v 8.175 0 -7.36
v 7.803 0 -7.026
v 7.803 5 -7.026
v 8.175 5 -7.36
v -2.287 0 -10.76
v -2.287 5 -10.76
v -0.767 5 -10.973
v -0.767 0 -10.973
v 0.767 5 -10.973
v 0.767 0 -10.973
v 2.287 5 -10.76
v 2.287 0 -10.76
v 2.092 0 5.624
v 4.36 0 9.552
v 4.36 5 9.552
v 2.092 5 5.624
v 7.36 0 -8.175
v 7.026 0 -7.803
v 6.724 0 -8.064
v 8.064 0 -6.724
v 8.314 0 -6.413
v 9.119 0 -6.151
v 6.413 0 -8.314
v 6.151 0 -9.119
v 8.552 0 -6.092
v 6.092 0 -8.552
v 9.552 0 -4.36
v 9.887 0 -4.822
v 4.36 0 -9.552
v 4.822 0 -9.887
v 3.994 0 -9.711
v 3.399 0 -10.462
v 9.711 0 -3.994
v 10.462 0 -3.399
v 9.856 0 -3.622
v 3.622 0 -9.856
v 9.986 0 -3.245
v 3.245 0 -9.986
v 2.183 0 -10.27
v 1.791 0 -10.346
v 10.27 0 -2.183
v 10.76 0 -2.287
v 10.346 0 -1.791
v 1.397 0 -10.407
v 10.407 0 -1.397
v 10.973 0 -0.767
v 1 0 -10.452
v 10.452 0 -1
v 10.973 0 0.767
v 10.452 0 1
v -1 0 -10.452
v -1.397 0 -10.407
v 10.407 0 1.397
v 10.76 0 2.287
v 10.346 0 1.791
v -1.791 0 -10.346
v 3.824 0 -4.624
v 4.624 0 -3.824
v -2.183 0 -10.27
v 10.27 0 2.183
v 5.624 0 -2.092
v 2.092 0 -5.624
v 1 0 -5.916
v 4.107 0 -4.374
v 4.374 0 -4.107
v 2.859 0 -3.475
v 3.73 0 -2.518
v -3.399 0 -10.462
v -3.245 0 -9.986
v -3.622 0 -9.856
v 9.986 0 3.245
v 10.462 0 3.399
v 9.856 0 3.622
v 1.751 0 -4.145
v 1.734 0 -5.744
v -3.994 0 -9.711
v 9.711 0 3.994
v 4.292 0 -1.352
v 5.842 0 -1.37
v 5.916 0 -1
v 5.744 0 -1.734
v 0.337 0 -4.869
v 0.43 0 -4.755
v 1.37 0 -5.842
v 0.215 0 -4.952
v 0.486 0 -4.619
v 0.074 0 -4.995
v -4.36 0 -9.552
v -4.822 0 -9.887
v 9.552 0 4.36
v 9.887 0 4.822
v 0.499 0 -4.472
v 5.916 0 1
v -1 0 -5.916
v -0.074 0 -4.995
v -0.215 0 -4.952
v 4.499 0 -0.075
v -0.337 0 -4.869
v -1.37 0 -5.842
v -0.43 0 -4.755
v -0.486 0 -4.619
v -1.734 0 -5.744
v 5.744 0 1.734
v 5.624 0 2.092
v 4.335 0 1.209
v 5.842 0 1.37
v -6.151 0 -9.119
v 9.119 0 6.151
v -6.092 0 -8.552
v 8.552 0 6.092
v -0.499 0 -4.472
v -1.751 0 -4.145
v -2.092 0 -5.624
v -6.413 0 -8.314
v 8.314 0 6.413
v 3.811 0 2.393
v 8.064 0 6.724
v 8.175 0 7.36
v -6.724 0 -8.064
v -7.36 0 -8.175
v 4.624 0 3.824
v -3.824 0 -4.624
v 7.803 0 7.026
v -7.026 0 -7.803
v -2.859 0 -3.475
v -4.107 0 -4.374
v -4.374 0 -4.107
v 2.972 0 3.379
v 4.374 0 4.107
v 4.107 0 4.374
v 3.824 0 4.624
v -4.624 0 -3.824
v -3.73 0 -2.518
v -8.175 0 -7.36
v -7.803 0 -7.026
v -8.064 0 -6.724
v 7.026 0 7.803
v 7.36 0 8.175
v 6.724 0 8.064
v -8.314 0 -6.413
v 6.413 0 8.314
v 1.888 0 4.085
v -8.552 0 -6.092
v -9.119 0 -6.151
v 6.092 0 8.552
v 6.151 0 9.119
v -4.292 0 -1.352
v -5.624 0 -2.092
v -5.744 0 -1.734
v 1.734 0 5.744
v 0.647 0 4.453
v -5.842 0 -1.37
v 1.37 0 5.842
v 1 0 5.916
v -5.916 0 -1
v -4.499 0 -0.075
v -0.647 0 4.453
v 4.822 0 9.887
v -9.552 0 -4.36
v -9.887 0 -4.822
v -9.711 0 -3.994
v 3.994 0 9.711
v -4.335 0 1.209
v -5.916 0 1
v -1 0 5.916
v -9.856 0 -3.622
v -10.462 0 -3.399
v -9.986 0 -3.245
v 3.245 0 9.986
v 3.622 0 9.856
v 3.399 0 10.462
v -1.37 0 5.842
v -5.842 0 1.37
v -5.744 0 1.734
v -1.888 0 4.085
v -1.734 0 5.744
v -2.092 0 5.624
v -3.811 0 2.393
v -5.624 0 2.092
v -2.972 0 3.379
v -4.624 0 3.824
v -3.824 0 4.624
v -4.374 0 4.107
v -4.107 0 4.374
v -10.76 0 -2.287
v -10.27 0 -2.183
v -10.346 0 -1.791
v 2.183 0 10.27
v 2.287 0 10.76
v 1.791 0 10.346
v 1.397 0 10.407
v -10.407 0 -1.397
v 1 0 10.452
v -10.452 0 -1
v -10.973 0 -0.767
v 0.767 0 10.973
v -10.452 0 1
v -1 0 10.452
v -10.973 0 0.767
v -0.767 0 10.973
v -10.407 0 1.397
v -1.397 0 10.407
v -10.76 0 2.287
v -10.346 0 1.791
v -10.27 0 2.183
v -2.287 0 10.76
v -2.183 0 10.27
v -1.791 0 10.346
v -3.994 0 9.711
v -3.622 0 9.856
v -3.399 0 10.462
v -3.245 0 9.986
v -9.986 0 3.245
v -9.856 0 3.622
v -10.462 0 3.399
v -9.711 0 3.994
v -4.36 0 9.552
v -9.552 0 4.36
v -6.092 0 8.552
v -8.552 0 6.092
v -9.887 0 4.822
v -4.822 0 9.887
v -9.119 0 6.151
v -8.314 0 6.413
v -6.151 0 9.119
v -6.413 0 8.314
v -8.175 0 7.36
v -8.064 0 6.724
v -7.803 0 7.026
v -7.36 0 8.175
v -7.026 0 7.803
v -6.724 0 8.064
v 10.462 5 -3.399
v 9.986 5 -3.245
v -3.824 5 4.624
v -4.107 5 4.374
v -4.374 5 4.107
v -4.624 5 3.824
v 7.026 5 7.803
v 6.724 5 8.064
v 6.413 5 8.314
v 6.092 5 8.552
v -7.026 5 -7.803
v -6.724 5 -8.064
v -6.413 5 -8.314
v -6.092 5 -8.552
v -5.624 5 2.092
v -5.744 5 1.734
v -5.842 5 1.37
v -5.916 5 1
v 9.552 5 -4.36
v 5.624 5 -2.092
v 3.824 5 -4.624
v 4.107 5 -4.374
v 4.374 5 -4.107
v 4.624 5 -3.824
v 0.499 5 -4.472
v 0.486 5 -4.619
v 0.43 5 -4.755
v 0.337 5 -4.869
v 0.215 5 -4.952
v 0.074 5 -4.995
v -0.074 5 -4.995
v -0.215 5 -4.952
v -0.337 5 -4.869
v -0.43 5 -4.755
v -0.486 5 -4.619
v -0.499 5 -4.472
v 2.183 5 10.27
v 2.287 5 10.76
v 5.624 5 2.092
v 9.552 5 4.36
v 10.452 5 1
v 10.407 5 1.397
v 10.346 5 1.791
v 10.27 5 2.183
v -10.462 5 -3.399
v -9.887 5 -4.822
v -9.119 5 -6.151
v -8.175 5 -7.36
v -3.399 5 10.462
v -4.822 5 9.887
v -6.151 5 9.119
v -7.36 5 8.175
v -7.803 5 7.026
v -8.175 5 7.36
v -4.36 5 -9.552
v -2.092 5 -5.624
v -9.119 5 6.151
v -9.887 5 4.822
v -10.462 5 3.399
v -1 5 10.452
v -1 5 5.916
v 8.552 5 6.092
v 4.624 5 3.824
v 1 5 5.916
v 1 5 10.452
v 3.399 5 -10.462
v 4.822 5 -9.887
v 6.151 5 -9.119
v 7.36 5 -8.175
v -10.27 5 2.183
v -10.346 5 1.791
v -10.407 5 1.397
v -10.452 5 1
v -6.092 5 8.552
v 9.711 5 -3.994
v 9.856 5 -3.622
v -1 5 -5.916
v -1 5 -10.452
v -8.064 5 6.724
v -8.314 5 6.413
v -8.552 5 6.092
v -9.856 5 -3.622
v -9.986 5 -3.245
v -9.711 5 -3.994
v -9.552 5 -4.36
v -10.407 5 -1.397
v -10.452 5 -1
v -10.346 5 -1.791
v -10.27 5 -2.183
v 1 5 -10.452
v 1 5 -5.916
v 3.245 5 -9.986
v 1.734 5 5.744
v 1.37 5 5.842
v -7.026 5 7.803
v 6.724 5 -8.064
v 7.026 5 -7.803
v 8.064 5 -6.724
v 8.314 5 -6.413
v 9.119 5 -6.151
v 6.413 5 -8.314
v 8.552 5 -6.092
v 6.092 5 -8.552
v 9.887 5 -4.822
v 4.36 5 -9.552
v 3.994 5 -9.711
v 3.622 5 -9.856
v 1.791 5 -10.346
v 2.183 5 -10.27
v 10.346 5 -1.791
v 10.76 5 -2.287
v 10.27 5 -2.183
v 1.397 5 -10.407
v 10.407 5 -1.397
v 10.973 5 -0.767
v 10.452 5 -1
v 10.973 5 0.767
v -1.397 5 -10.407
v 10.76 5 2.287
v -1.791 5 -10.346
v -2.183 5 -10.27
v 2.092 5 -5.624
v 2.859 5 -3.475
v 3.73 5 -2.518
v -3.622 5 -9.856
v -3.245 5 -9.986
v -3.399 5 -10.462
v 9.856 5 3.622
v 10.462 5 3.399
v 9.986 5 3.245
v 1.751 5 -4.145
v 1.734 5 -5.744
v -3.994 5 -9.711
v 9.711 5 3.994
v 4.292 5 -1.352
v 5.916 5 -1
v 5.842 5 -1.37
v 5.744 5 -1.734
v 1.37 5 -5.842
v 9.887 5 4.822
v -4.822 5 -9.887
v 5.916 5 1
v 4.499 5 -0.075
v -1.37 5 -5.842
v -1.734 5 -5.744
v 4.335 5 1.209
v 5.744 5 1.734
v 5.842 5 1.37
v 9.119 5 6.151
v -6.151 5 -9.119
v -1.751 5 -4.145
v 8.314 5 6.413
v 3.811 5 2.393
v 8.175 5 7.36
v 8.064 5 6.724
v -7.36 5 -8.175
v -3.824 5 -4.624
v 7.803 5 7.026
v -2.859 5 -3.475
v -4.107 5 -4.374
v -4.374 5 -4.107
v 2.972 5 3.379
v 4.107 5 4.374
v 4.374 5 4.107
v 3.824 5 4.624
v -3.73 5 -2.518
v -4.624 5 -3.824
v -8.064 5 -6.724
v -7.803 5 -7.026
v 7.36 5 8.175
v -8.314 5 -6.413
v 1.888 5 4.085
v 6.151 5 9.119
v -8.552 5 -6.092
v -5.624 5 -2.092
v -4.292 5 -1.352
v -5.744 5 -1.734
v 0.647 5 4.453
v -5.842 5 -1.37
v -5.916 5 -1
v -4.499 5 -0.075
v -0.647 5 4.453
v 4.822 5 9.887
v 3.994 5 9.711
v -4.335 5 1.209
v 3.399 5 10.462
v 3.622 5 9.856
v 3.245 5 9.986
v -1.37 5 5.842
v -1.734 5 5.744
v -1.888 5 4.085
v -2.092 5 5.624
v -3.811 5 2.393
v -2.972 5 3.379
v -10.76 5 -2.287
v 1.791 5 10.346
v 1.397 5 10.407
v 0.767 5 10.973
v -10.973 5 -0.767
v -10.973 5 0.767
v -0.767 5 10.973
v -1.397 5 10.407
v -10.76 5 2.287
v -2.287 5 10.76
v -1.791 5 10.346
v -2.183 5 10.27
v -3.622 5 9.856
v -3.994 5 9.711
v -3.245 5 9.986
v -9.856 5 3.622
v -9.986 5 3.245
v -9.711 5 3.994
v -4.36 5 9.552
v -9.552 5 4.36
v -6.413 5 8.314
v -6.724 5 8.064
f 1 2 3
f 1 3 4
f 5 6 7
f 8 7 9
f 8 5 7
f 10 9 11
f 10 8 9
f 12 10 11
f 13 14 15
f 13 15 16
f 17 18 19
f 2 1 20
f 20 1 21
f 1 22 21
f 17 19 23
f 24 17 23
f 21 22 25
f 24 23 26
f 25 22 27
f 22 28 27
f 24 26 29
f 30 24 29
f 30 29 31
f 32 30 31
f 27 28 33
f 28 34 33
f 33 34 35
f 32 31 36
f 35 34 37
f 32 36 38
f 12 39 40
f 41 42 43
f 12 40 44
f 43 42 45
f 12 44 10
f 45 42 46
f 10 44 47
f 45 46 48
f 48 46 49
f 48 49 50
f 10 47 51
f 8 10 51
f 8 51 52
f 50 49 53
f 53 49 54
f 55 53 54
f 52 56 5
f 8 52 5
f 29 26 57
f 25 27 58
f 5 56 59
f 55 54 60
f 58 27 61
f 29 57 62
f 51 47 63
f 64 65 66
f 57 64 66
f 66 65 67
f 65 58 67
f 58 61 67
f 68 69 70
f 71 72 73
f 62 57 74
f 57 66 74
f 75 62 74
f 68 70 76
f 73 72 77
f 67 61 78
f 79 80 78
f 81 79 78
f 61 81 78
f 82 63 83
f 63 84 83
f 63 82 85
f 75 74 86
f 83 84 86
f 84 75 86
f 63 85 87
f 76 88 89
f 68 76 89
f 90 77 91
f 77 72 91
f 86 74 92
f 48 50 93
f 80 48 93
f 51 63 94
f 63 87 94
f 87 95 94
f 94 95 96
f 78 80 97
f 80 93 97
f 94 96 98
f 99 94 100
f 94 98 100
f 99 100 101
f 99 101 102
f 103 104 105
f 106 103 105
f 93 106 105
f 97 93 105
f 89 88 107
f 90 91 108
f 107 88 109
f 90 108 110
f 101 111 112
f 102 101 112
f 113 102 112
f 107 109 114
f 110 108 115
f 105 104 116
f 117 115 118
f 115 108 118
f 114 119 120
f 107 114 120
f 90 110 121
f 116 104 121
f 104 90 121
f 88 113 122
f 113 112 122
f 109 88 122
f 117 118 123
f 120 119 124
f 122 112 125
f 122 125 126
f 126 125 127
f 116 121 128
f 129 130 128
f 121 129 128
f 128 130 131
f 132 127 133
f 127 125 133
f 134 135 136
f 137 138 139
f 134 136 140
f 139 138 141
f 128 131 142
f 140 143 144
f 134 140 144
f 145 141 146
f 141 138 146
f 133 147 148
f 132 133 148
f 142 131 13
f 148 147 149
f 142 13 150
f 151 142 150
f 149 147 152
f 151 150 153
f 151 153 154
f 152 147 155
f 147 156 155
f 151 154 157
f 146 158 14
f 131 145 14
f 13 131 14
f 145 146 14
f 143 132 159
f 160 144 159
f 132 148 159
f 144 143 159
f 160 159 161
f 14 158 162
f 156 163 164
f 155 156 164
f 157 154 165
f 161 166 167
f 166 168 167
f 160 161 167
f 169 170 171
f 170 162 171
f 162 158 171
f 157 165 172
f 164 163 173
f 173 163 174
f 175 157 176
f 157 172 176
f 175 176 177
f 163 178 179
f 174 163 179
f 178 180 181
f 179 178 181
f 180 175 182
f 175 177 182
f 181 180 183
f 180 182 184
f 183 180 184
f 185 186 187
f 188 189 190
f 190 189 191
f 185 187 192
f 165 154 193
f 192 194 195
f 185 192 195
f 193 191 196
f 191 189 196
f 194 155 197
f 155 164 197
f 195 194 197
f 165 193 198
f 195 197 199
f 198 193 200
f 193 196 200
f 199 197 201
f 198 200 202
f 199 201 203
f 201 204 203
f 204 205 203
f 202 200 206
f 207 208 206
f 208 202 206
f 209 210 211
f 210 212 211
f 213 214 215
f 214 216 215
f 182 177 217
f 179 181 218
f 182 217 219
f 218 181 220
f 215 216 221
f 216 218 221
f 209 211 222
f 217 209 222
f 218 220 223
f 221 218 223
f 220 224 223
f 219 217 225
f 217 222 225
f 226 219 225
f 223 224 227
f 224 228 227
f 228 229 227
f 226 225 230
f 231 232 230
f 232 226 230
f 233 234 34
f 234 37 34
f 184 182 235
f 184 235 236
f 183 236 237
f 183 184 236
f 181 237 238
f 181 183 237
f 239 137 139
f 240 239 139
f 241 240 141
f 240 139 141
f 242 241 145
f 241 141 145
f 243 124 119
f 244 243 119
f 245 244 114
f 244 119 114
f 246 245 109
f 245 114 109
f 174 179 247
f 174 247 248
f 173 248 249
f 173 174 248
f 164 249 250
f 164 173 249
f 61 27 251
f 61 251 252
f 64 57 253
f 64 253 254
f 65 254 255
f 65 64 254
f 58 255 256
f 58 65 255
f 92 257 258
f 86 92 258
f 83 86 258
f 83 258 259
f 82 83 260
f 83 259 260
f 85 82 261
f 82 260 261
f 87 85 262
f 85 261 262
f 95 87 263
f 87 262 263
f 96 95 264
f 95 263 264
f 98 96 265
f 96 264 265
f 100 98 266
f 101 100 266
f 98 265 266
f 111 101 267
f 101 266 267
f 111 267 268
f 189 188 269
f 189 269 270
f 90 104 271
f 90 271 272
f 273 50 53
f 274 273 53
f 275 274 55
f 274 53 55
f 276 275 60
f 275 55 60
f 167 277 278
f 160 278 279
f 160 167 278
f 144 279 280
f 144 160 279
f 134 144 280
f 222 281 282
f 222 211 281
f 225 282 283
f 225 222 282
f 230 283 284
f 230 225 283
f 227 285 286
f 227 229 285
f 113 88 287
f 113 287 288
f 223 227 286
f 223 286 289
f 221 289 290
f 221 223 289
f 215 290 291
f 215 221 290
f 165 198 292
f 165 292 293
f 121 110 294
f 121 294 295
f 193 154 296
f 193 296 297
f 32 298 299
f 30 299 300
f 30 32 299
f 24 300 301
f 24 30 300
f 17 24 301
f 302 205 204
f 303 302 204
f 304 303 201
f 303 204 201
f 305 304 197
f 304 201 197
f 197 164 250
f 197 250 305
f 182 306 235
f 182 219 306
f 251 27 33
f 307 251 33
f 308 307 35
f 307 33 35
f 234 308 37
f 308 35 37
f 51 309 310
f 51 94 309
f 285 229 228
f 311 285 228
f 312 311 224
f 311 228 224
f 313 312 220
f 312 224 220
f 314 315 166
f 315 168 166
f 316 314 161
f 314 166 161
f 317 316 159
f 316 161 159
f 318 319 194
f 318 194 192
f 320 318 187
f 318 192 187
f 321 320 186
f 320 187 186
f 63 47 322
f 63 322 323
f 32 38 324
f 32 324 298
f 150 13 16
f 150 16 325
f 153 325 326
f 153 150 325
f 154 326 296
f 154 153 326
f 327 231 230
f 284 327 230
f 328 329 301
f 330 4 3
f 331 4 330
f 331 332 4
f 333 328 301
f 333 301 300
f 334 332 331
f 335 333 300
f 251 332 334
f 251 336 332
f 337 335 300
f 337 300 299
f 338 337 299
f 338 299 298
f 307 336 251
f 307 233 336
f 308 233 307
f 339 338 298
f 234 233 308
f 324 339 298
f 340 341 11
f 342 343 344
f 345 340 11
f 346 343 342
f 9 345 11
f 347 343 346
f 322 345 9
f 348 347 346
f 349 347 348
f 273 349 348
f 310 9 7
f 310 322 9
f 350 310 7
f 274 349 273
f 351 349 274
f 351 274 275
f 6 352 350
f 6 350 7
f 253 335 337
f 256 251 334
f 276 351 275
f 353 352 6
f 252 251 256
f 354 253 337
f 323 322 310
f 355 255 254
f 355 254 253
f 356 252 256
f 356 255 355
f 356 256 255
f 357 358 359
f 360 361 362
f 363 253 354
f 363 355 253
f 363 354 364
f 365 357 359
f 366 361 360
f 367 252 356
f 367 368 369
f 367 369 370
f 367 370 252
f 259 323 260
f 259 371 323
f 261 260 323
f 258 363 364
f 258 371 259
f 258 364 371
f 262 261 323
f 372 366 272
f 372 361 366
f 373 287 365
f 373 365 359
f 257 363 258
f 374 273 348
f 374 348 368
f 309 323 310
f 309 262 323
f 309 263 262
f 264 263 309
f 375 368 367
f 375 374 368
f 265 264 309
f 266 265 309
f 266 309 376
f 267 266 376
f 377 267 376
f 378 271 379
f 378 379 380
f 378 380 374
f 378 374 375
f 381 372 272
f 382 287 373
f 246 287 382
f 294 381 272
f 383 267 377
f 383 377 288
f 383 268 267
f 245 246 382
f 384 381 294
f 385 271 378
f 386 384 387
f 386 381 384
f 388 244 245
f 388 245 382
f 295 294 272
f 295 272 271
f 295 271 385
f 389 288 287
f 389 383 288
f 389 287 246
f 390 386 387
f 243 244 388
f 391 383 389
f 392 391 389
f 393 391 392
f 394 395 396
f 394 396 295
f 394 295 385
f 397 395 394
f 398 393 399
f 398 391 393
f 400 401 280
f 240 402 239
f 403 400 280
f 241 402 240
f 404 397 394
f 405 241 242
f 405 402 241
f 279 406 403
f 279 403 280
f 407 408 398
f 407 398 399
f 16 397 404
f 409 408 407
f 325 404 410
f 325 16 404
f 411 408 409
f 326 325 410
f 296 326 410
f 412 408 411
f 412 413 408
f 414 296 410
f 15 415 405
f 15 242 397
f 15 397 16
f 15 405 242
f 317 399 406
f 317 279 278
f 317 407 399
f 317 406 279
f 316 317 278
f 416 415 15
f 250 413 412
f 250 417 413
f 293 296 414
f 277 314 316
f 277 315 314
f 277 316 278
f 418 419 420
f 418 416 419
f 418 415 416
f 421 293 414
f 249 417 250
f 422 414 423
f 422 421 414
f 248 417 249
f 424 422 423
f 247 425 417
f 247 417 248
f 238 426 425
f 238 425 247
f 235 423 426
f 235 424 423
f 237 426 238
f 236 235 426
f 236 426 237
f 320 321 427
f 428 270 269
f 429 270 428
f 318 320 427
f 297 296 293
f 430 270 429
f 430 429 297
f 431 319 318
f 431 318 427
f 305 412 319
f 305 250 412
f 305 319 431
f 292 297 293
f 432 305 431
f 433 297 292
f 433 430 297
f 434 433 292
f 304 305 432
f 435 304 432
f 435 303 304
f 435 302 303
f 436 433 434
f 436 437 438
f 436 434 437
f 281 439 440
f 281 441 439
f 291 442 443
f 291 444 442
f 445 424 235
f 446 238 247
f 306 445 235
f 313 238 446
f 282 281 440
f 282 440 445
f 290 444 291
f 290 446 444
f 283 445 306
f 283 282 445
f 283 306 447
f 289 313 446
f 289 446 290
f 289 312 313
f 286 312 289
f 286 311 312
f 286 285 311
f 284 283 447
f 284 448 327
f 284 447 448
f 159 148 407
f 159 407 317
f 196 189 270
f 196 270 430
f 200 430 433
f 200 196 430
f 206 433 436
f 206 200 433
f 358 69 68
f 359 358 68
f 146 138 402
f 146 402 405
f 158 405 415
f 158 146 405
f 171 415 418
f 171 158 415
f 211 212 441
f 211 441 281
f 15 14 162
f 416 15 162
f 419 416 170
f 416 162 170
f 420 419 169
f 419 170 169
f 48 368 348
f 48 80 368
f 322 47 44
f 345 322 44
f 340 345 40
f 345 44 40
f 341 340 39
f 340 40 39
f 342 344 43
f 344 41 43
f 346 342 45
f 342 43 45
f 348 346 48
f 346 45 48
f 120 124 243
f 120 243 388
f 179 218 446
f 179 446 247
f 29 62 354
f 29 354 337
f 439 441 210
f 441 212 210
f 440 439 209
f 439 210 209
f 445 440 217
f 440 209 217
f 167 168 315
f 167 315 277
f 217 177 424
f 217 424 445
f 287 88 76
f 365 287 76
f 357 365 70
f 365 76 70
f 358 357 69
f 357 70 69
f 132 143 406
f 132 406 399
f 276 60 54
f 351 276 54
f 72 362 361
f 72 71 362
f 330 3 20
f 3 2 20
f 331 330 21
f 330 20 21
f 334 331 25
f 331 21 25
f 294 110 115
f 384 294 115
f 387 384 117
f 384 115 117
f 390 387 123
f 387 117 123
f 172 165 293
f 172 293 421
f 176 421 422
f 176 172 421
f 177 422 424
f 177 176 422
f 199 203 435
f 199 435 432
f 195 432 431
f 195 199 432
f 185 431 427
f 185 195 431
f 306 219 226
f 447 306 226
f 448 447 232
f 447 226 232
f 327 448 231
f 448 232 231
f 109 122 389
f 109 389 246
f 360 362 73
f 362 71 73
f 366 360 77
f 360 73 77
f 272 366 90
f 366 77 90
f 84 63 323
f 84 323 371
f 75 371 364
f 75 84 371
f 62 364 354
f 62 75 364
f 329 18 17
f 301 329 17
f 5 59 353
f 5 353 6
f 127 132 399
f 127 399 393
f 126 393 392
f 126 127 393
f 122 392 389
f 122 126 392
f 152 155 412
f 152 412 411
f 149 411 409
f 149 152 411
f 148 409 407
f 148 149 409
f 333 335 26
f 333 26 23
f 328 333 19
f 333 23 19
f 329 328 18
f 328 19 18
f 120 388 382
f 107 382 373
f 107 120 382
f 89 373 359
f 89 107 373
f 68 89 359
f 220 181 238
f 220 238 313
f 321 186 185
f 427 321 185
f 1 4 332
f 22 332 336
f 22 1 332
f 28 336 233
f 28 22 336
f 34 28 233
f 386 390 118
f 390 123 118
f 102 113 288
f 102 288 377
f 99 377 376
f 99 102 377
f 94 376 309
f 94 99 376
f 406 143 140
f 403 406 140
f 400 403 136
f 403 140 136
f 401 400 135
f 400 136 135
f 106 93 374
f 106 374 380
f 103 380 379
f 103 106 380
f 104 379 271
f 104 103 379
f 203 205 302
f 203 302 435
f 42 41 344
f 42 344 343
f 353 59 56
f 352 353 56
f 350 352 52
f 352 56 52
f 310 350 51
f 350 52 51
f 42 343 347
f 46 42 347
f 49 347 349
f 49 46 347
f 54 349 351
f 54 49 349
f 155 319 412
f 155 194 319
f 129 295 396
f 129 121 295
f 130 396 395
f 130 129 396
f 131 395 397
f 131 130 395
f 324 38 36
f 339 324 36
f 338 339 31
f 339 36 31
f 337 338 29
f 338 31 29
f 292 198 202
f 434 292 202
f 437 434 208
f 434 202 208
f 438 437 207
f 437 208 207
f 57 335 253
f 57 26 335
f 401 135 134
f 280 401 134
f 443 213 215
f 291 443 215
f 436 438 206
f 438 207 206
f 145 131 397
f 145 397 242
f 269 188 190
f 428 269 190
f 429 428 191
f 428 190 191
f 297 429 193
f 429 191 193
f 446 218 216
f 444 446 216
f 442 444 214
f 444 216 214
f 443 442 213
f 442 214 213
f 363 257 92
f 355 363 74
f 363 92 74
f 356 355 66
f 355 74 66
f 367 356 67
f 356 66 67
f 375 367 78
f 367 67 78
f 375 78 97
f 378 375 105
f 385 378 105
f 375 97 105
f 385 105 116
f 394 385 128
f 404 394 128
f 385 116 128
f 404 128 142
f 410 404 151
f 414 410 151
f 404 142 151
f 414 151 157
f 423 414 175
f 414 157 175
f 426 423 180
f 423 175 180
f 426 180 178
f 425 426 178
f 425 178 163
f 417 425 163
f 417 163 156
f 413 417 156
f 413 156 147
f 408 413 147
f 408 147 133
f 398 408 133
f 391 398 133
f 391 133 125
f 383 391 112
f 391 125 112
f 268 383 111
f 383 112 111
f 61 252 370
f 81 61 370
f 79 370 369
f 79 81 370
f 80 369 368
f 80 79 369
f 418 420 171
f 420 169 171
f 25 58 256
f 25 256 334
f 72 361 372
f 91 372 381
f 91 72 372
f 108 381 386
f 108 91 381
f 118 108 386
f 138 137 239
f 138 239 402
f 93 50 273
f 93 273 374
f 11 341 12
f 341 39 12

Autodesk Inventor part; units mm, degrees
ref_plane "YZ Plane" through (0, 0, 0) normal (1, 0, 0) x (0, 1, 0)
ref_plane "XZ Plane" through (0, 0, 0) normal (0, 1, 0) x (-1, 0, 0)
ref_plane "XY Plane" through (0, 0, 0) normal (0, 0, 1) x (1, 0, 0)
sketch "Sketch1" plane through (0, 0, 0) normal (0, 1, 0) x (-1, 0, 0)
  circle A0 centre (0, 0) radius 4.5
  circle A1 centre (0, 0) radius 11
  circle A2 centre (0, 0) radius 6
  circle A3 centre (0, 0) radius 10.5
  line L0 (0, 0) -> (11, 0) construction
  line L1 (5.9161, 1) -> (10.9545, 1)
  line L2 (10.9545, 1) -> (10.9545, -1) construction
  line L3 (10.9545, -1) -> (5.9161, -1)
  line L4 (5.9161, -1) -> (5.9161, 1) construction
  line L5 (5.9161, 1) -> (10.9545, -1) construction
  line L6 (10.9545, 1) -> (5.9161, -1) construction
  line L7 (9.9868, 4.6112) -> (5.6235, 2.092)
  line L8 (4.6235, 3.8241) -> (8.9868, 6.3433)
  line L9 (6.3433, 8.9868) -> (3.8241, 4.6235)
  line L10 (2.092, 5.6235) -> (4.6112, 9.9868)
  line L11 (1, 10.9545) -> (1, 5.9161)
  line L12 (-1, 5.9161) -> (-1, 10.9545)
  line L13 (-4.6112, 9.9868) -> (-2.092, 5.6235)
  line L14 (-3.8241, 4.6235) -> (-6.3433, 8.9868)
  line L15 (-8.9868, 6.3433) -> (-4.6235, 3.8241)
  line L16 (-5.6235, 2.092) -> (-9.9868, 4.6112)
  line L17 (-10.9545, 1) -> (-5.9161, 1)
  line L18 (-5.9161, -1) -> (-10.9545, -1)
  line L19 (-9.9868, -4.6112) -> (-5.6235, -2.092)
  line L20 (-4.6235, -3.8241) -> (-8.9868, -6.3433)
  line L21 (-6.3433, -8.9868) -> (-3.8241, -4.6235)
  line L22 (-2.092, -5.6235) -> (-4.6112, -9.9868)
  line L23 (-1, -10.9545) -> (-1, -5.9161)
  line L24 (1, -5.9161) -> (1, -10.9545)
  line L25 (4.6112, -9.9868) -> (2.092, -5.6235)
  line L26 (3.8241, -4.6235) -> (6.3433, -8.9868)
  line L27 (8.9868, -6.3433) -> (4.6235, -3.8241)
  line L28 (5.6235, -2.092) -> (9.9868, -4.6112)
  line L29 (10.2705, -2.1831) -> (10.7596, -2.287)
  line L30 (10.2705, 2.1831) -> (10.7596, 2.287)
  line L31 (9.9861, 3.2447) -> (10.4616, 3.3992)
  line L32 (7.803, 7.0259) -> (8.1746, 7.3604)
  line L33 (7.0259, 7.803) -> (7.3604, 8.1746)
  line L34 (3.2447, 9.9861) -> (3.3992, 10.4616)
  line L35 (2.1831, 10.2705) -> (2.287, 10.7596)
  line L36 (-2.1831, 10.2705) -> (-2.287, 10.7596)
  line L37 (-3.2447, 9.9861) -> (-3.3992, 10.4616)
  line L38 (-7.0259, 7.803) -> (-7.3604, 8.1746)
  line L39 (-7.803, 7.0259) -> (-8.1746, 7.3604)
  line L40 (-9.9861, 3.2447) -> (-10.4616, 3.3992)
  line L41 (-10.2705, 2.1831) -> (-10.7596, 2.287)
  line L42 (-10.2705, -2.1831) -> (-10.7596, -2.287)
  line L43 (-9.9861, -3.2447) -> (-10.4616, -3.3992)
  line L44 (-7.803, -7.0259) -> (-8.1746, -7.3604)
  line L45 (-7.0259, -7.803) -> (-7.3604, -8.1746)
  line L46 (-3.2447, -9.9861) -> (-3.3992, -10.4616)
  line L47 (-2.1831, -10.2705) -> (-2.287, -10.7596)
  line L48 (2.1831, -10.2705) -> (2.287, -10.7596)
  line L49 (3.2447, -9.9861) -> (3.3992, -10.4616)
  line L50 (7.0259, -7.803) -> (7.3604, -8.1746)
  line L51 (7.803, -7.0259) -> (8.1746, -7.3604)
  line L52 (9.9861, -3.2447) -> (10.4616, -3.3992)
  point P0 (8.4353, 0)
  point P1 (8.4353, 1)
  point P2 (6.8052, 5.0837)
  point P3 (3.3516, 7.8052)
  point P4 (-1, 8.4353)
  point P5 (-5.0837, 6.8052)
  point P6 (-7.8052, 3.3516)
  point P7 (-8.4353, -1)
  point P8 (-6.8052, -5.0837)
  point P9 (-3.3516, -7.8052)
  point P10 (1, -8.4353)
  point P11 (5.0837, -6.8052)
  point P12 (7.8052, -3.3516)
  point P13 (9.9861, -3.2447)
  point P14 (9.5519, -4.3601)
  point P15 (10.4523, -1)
  point P16 (10.2705, 2.1831)
  point P17 (10.4523, 1)
  point P18 (9.5519, 4.3601)
  point P19 (9.9861, 3.2447)
  point P20 (7.803, 7.0259)
  point P21 (8.5519, 6.0922)
  point P22 (6.0922, 8.5519)
  point P23 (7.0259, 7.803)
  point P24 (3.2447, 9.9861)
  point P25 (4.3601, 9.5519)
  point P26 (1, 10.4523)
  point P27 (2.1831, 10.2705)
  point P28 (-1, 10.4523)
  point P29 (-4.3601, 9.5519)
  point P30 (-6.0922, 8.5519)
  point P31 (-8.5519, 6.0922)
  point P32 (-7.803, 7.0259)
  point P33 (-9.9861, 3.2447)
  point P34 (-9.5519, 4.3601)
  point P35 (-10.4523, 1)
  point P36 (-10.2705, 2.1831)
  point P37 (-10.2705, -2.1831)
  point P38 (-10.4523, -1)
  point P39 (-9.5519, -4.3601)
  point P40 (-9.9861, -3.2447)
  point P41 (-7.803, -7.0259)
  point P42 (-8.5519, -6.0922)
  point P43 (-6.0922, -8.5519)
  point P44 (-7.0259, -7.803)
  point P45 (-3.2447, -9.9861)
  point P46 (-4.3601, -9.5519)
  point P47 (-1, -10.4523)
  point P48 (-2.1831, -10.2705)
  point P49 (2.1831, -10.2705)
  point P50 (1, -10.4523)
  point P51 (4.3601, -9.5519)
  point P52 (3.2447, -9.9861)
  point P53 (6.0922, -8.5519)
  point P54 (8.5519, -6.0922)
  point P55 (7.803, -7.0259)
  dimension "d1" = 22
  dimension "d2" = 12
  dimension "d3" = 0.5
  dimension "d0" = 9
  dimension "d4" = 2
  dimension "d7" = 360
  dimension "d9" = 12
  dimension "d12" = 360
extrude "Extrusion1" add sketch "Sketch1" along normal blind 5 contours A1 L3 A3 L1 | L1 A3 L30 A1 | A1 L29 A3 L3 | A3 L3 A2 L1 | L31 A3 L7 A1 | A2 | A1 L28 A3 L52 | L7 A3 L8 A1 | A2 L8 A3 L7 | A1 L27 A3 L28 | L28 A3 L27 A2 | L8 A3 L32 A1 | A1 L51 A3 L27 | A2 L10 A3 L9 | L26 A3 L25 A2 | L33 A3 L9 A1 | A3 L10 A1 L9 | A1 L26 A3 L50 | L26 A1 L25 A3 | A2 L12 A3 L11 | A3 L34 A1 L10 | L24 A3 L23 A2 | L25 A1 L49 A3 | L11 A1 L35 A3 | A3 L12 A1 L11 | L24 A1 L23 A3 | A3 L48 A1 L24 | A2 L14 A3 L13 | A3 L36 A1 L12 | L22 A3 L21 A2 | L23 A1 L47 A3 | L13 A1 L37 A3 | A3 L14 A1 L13 | L22 A1 L21 A3 | A3 L46 A1 L22 | A2 L16 A3 L15 | A3 L38 A1 L14 | L20 A3 L19 A2 | L21 A1 L45 A3 | L15 A1 L39 A3 | A3 L16 A1 L15 | L20 A1 L19 A3 | A3 L44 A1 L20 | A2 L18 A3 L17 | A3 L40 A1 L16 | L19 A1 L43 A3 | L17 A1 L41 A3 | A3 L18 A1 L17 | A3 L42 A1 L18
sketch "Sketch2" plane through (0, 5, 0) normal (0, 1, 0) x (1, 0, 0)
  circle A0 centre (0, 0) radius 4.5 projected
  circle A1 centre (0, 4.5) radius 0.5
  line L0 (0, 0) -> (0, 4.5) construction
  dimension "d16" = 1
extrude "Extrusion2" cut sketch "Sketch2" against normal through all contours A1 A0 | A0 A1 picked at (0.0194, 4.3324) picked at (0.0158, 4.6639)
properties part number "STATOR" material "Stainless Steel"
